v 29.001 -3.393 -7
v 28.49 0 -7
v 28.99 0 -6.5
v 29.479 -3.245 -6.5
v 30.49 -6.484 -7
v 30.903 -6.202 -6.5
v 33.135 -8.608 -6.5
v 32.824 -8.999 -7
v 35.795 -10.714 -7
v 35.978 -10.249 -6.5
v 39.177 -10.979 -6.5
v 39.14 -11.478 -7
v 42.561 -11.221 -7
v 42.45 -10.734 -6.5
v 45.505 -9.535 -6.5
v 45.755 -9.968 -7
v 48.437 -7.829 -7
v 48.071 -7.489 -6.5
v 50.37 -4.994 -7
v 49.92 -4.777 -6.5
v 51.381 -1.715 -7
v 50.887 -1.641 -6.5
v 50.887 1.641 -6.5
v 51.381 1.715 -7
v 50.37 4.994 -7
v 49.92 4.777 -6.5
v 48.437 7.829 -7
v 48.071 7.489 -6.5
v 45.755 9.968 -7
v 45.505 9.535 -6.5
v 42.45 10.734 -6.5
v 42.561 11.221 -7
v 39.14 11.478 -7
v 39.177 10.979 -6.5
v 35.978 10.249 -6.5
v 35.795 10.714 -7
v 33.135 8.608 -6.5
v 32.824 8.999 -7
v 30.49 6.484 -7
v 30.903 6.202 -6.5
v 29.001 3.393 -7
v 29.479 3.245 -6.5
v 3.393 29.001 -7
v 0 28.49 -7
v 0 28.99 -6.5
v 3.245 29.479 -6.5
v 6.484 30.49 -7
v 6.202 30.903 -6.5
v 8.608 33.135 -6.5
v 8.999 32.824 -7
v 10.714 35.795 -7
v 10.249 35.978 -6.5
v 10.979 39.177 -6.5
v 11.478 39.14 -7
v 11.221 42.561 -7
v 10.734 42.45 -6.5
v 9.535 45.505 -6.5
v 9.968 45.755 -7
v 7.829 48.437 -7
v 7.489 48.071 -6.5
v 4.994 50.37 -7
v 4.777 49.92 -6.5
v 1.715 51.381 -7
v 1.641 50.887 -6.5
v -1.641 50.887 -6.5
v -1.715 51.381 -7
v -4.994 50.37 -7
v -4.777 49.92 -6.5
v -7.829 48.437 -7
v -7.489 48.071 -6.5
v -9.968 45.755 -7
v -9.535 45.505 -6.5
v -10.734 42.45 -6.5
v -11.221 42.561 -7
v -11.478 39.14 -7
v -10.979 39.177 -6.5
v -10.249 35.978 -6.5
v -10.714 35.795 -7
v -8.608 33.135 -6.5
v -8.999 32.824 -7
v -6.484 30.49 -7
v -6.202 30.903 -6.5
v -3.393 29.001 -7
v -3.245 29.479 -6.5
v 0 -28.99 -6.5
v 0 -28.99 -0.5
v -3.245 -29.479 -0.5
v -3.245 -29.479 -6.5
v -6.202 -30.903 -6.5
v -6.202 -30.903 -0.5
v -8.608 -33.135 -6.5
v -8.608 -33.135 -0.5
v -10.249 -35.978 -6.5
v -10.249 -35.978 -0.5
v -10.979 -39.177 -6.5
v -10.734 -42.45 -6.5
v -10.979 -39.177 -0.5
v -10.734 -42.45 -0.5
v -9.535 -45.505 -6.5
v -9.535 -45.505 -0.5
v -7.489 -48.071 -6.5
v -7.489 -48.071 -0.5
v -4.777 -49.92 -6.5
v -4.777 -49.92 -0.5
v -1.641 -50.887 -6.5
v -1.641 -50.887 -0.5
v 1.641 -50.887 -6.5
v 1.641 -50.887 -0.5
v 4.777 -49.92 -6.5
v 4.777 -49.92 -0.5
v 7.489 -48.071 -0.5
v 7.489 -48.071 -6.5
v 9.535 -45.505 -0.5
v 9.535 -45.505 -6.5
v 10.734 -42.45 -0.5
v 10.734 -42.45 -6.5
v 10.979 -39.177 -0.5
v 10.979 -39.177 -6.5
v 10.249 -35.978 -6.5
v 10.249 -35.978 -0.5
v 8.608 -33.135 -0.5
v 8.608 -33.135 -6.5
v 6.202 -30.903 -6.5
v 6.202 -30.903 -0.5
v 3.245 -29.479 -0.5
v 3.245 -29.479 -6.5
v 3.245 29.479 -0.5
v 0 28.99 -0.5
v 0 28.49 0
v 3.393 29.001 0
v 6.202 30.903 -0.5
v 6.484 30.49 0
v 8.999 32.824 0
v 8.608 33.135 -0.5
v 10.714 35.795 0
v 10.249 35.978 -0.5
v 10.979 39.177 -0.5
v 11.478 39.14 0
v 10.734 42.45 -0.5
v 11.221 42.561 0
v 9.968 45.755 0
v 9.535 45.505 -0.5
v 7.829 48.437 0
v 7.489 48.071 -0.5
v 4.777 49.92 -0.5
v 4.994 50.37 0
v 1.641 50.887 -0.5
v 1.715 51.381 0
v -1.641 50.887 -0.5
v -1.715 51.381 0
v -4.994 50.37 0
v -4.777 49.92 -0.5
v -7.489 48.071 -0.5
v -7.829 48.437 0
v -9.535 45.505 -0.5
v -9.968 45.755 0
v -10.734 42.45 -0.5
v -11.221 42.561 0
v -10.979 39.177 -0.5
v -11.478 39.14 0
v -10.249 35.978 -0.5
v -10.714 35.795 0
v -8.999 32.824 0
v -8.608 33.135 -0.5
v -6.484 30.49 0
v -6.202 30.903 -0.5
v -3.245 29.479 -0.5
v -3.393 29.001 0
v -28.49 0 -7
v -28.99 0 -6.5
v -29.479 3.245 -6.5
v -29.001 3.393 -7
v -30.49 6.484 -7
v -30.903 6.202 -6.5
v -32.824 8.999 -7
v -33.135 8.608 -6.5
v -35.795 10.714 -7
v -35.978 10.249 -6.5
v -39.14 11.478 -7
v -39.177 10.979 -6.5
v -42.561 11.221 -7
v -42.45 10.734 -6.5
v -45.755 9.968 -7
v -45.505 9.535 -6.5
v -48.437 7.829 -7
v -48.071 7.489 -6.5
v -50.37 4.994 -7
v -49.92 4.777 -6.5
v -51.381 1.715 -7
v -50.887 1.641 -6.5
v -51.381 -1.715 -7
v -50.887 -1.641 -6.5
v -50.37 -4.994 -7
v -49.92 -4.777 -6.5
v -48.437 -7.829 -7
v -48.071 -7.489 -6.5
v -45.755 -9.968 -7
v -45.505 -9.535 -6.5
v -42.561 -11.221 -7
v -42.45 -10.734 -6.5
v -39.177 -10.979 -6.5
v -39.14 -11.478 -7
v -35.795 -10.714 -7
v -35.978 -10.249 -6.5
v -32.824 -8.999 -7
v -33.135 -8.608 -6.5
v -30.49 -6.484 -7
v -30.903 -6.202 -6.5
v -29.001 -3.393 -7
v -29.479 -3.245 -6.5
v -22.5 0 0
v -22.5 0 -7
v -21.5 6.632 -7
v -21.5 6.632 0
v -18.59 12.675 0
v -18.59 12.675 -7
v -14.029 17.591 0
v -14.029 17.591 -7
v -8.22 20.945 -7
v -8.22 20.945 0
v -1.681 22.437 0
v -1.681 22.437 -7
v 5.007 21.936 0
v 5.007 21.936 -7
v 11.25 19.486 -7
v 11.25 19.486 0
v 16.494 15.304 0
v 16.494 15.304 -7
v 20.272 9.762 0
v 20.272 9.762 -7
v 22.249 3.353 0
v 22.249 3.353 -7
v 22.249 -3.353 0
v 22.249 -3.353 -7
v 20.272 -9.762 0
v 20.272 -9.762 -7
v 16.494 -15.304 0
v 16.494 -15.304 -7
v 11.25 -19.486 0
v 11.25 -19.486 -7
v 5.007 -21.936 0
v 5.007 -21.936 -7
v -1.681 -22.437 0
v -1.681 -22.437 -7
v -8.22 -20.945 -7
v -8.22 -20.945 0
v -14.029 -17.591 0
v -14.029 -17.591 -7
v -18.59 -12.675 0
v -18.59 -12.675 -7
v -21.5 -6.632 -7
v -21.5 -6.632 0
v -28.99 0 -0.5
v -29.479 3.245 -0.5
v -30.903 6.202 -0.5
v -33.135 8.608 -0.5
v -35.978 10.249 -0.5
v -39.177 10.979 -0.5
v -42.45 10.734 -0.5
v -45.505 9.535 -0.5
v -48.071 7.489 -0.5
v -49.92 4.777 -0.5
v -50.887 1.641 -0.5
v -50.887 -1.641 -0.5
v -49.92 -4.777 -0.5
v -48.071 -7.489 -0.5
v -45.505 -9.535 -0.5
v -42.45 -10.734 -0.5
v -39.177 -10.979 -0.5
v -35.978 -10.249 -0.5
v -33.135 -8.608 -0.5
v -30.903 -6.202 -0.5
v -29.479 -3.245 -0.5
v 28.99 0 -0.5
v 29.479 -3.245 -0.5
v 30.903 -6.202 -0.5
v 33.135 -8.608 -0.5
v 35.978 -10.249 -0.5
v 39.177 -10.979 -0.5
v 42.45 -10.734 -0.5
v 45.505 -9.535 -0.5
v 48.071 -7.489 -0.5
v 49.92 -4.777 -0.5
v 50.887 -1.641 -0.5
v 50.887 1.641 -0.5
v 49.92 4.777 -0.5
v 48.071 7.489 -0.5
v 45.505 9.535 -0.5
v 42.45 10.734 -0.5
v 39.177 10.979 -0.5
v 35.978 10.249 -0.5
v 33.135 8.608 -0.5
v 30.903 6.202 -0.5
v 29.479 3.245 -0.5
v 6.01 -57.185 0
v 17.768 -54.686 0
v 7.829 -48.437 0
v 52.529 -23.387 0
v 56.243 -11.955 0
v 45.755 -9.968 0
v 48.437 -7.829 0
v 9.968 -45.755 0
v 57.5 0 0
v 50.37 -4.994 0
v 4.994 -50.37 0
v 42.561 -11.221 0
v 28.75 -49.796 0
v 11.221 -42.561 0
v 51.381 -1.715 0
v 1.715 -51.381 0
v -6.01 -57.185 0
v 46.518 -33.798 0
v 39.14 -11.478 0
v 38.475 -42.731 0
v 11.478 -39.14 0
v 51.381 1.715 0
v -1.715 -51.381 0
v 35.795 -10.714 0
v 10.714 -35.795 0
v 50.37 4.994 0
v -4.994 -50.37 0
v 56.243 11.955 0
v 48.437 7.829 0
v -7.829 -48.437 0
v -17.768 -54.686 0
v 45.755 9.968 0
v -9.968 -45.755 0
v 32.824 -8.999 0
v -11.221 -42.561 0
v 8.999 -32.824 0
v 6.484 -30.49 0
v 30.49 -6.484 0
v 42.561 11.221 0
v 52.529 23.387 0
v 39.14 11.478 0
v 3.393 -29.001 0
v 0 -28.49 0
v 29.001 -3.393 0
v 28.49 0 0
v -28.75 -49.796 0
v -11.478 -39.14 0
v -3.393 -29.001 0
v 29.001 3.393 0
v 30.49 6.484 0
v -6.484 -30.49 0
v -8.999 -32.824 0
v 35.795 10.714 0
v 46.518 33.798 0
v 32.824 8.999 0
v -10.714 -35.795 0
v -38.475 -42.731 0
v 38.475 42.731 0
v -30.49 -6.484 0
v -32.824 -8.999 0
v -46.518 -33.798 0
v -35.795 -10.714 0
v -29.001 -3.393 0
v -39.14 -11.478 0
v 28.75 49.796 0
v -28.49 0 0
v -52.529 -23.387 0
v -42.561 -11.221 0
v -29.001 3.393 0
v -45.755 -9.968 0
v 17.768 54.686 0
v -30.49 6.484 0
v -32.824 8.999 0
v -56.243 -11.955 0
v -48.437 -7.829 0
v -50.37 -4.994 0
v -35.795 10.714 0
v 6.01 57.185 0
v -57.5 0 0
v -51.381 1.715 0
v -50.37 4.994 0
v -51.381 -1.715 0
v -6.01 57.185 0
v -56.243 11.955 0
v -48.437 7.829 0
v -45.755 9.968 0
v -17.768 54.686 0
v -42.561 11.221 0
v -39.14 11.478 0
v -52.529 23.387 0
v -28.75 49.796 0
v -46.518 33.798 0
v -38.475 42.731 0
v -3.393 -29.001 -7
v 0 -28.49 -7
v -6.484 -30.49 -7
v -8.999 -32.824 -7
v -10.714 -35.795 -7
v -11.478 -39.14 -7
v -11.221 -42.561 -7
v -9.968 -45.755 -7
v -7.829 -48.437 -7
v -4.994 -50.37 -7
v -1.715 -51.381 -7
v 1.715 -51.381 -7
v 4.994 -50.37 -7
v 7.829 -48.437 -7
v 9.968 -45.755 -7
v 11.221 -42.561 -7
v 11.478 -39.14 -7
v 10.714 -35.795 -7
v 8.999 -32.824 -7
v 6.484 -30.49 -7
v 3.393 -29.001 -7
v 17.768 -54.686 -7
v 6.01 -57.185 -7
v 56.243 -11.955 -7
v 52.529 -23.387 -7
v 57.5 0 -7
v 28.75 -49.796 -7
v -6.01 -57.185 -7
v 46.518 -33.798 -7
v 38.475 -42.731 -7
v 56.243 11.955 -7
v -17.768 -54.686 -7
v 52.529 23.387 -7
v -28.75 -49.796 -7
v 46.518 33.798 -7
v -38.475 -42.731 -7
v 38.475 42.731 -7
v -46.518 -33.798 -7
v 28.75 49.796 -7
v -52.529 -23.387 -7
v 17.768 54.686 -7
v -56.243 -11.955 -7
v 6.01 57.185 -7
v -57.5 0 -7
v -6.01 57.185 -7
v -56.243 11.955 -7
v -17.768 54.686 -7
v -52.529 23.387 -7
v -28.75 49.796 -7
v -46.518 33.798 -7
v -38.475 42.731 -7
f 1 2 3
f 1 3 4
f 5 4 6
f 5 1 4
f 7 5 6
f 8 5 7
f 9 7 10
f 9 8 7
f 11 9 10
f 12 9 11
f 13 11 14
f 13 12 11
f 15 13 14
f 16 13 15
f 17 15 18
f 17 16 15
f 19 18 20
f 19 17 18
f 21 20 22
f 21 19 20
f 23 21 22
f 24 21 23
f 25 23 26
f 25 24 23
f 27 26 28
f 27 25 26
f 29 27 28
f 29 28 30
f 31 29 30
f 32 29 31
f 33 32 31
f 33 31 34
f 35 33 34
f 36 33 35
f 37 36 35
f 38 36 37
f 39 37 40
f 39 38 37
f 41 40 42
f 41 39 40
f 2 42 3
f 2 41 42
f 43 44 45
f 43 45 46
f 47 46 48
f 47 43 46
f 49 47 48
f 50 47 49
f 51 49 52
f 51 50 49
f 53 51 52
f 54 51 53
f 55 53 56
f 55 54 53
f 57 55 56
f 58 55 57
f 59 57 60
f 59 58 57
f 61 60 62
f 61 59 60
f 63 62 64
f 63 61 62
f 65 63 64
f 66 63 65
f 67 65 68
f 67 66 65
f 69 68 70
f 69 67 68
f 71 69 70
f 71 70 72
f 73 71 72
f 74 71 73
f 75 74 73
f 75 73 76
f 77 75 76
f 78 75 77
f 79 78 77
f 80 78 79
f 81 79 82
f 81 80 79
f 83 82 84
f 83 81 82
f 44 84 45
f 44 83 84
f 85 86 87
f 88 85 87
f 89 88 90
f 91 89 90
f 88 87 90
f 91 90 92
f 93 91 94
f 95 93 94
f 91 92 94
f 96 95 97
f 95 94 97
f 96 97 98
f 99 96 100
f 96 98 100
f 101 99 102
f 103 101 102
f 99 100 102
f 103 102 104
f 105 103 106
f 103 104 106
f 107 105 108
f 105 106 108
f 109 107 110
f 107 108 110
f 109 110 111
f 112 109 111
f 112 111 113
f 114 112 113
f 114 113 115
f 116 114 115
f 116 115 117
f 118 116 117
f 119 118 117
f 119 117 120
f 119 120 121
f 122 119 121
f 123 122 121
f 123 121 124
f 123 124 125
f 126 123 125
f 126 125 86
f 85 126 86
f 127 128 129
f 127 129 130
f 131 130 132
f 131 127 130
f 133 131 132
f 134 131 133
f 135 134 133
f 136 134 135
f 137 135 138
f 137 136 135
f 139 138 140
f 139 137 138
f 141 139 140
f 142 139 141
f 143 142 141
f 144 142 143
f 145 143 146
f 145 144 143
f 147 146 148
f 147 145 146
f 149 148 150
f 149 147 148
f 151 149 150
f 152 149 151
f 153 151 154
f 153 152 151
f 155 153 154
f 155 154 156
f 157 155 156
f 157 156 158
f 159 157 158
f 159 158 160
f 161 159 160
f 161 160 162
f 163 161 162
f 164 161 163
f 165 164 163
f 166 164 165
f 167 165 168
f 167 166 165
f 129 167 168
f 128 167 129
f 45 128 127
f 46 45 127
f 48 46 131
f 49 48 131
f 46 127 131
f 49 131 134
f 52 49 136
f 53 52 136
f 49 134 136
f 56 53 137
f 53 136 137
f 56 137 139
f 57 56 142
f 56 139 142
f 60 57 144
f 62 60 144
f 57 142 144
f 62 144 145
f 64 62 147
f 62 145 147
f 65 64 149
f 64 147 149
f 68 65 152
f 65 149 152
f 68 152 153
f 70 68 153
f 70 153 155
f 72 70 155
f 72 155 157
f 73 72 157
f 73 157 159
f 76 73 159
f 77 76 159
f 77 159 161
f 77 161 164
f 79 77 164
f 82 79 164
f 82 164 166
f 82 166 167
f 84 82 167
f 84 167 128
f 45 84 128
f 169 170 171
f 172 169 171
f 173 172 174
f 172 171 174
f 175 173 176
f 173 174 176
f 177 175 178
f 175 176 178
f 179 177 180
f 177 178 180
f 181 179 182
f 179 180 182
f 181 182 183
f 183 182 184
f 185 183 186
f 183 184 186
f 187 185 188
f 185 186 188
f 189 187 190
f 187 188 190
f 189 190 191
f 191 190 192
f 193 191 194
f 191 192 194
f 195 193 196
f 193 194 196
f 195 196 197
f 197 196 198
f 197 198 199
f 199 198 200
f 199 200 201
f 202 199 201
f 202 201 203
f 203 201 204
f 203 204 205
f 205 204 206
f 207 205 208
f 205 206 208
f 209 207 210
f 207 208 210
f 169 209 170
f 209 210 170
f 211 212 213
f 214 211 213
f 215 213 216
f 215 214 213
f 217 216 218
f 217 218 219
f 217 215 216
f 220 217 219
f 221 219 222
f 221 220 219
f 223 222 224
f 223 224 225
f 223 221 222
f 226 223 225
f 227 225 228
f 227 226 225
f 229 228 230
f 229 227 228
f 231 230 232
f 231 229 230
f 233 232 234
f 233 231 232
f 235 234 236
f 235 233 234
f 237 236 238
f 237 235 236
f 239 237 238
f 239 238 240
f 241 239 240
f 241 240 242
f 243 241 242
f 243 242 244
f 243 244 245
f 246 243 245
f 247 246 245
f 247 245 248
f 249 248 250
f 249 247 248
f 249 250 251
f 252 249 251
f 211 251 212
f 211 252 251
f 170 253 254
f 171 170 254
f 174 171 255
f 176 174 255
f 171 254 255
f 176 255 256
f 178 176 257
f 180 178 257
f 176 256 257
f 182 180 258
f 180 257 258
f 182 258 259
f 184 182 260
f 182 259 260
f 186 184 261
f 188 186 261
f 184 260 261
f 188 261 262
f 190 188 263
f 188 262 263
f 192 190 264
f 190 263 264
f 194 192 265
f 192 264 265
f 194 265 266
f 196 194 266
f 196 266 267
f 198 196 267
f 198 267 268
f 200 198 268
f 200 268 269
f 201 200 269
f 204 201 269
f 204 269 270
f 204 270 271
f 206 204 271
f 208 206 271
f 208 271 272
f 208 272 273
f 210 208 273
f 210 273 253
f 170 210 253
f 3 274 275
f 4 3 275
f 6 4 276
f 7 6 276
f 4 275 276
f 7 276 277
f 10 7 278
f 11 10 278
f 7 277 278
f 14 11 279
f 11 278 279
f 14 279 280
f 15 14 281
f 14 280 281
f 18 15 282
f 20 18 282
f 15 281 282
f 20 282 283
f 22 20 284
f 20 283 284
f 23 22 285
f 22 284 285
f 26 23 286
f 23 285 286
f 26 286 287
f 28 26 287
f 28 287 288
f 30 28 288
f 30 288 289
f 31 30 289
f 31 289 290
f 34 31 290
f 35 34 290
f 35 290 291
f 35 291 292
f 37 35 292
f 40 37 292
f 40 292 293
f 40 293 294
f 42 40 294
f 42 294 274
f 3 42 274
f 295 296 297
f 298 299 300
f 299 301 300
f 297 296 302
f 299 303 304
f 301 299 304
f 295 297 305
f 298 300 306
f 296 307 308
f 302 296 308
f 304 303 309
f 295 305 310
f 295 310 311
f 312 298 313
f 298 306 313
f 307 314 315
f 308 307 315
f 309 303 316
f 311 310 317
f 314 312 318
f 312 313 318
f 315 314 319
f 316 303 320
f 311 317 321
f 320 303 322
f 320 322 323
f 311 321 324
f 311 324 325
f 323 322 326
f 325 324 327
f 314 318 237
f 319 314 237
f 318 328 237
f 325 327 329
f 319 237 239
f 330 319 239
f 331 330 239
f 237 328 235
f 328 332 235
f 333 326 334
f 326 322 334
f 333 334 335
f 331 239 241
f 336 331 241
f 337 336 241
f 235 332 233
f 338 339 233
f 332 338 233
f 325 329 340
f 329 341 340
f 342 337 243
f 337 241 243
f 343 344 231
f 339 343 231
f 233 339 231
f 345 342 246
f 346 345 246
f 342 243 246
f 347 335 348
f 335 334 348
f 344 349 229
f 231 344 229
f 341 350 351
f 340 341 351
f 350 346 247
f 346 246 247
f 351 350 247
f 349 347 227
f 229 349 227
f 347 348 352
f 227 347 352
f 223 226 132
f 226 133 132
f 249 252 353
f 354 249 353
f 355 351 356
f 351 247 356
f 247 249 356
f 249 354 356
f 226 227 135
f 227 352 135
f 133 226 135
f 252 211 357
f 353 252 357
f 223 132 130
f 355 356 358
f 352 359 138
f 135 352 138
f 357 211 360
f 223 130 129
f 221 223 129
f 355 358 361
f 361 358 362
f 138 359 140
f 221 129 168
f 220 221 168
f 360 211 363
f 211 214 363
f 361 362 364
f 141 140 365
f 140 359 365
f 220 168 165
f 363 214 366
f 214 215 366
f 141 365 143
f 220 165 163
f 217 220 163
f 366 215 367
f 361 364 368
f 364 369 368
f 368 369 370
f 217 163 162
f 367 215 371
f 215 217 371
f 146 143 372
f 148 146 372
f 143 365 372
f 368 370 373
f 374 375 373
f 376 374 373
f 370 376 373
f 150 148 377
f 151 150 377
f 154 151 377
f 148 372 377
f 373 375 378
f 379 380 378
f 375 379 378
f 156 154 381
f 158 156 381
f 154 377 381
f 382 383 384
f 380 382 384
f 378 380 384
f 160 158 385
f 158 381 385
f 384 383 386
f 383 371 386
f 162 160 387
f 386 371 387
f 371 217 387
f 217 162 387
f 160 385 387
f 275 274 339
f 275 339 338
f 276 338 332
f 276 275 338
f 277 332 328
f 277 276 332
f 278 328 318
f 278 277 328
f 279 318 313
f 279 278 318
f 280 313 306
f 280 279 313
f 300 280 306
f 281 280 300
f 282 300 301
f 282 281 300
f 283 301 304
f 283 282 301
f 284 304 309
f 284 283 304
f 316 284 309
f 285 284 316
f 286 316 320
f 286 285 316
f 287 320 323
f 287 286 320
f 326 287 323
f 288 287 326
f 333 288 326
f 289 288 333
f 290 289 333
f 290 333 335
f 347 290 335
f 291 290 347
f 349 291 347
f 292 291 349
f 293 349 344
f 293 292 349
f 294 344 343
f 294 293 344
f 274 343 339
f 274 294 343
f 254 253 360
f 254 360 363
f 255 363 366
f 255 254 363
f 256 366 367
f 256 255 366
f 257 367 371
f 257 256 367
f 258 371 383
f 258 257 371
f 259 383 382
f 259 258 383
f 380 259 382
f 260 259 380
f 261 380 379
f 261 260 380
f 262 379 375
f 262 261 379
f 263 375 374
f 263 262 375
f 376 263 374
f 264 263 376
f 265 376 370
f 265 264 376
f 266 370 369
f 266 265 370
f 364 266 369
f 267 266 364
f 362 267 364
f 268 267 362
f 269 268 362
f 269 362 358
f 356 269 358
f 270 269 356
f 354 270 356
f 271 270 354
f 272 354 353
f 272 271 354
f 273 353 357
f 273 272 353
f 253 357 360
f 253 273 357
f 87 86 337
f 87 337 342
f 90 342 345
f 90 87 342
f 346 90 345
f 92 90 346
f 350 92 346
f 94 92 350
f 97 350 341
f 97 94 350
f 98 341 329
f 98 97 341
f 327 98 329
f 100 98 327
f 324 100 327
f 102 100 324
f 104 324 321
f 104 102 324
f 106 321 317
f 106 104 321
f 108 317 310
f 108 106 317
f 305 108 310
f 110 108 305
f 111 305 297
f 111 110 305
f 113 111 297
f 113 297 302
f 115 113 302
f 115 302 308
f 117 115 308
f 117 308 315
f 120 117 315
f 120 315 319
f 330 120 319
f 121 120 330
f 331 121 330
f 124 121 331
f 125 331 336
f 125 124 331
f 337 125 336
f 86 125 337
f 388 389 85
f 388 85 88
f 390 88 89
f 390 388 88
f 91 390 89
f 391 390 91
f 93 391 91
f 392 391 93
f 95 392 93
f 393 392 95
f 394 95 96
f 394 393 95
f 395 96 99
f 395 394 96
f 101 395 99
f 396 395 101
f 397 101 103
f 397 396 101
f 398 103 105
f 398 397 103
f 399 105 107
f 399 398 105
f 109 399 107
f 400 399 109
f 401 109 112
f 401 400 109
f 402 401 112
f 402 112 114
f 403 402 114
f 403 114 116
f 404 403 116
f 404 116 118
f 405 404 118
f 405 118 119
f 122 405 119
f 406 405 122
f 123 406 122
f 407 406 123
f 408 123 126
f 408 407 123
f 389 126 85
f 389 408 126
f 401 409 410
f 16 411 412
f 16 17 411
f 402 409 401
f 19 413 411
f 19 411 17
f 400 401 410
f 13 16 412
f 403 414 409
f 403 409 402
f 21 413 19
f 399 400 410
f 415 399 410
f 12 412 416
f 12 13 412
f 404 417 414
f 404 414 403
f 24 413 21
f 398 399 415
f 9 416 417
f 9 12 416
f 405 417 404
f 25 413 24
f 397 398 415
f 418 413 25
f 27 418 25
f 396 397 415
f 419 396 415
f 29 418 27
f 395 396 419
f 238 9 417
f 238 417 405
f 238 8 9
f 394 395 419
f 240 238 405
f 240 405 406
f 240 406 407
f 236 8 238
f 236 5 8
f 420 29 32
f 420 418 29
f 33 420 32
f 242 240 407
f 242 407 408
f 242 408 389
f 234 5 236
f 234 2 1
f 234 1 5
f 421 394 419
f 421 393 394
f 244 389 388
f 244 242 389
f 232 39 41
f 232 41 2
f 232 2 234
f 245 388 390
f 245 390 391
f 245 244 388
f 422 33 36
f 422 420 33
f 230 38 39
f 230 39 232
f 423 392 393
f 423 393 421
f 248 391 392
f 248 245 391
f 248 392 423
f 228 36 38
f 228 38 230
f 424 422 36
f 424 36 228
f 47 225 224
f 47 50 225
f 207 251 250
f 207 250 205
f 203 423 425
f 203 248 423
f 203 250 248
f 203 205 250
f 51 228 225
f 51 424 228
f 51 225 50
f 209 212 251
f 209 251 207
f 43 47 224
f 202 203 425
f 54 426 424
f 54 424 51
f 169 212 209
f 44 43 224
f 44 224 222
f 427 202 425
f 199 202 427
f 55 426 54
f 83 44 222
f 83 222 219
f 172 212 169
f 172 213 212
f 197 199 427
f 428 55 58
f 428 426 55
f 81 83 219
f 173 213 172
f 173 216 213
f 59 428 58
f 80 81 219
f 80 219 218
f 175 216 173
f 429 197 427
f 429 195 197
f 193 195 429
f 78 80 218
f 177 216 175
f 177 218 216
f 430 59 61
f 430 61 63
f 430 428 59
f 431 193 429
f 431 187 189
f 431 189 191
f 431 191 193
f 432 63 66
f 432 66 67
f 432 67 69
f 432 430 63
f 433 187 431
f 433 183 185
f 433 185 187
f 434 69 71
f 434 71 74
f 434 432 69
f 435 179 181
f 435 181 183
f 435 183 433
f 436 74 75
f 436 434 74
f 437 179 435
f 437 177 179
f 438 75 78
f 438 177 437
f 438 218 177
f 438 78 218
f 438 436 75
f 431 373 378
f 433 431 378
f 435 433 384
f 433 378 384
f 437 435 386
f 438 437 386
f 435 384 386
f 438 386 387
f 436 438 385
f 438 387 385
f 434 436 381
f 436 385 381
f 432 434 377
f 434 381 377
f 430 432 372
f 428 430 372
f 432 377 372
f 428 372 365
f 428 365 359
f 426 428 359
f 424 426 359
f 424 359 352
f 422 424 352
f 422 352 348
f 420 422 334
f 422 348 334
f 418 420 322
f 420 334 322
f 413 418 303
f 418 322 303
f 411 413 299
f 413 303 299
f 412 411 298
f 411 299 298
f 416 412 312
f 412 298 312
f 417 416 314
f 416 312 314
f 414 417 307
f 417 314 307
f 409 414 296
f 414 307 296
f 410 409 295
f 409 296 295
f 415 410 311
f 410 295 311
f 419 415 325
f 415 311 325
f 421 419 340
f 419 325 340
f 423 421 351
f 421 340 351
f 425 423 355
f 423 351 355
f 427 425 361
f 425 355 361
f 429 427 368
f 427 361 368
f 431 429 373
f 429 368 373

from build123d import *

# Parameters (mm, degrees)
SKETCH3_R                    = 57.5
SKETCH3_R_2                  = 22.5
BOSS_EXTRUDE2_DEPTH          = 7
SKETCH12_R                   = 11.01
CUT_EXTRUDE7_DEPTH           = 82.618012718
CHAMFER5_SIZE                = 0.5
CIRPATTERN4_COUNT            = 4
CHAMFER5_OF_CIRPATTERN4_SIZE = 0.5


with BuildPart() as part:
    # Sketch3 → Boss-Extrude2 (new body)
    with BuildSketch(Plane(origin=(0, 0, 0), x_dir=(-1, 0, 0), z_dir=(0, 0, -1))):
        Circle(SKETCH3_R)
        Circle(SKETCH3_R_2, mode=Mode.SUBTRACT)
    extrude(amount=BOSS_EXTRUDE2_DEPTH)

    # Sketch12 → Cut-Extrude7 (cut, through all)
    with BuildSketch(Plane.XY):
        with Locations((-40, 0)):
            Circle(SKETCH12_R)
    cut_extrude7 = extrude(amount=-CUT_EXTRUDE7_DEPTH, mode=Mode.SUBTRACT)

    # Chamfer5
    chamfer5_edges = [part.edges().sort_by_distance(p)[0] for p in [
        (-51.01, 0, -7),
        (-51.01, 0, 0),
    ]]
    chamfer(chamfer5_edges, length=CHAMFER5_SIZE)

    # CirPattern4: Cut-Extrude7 ×4 about axis
    cirpattern4_axis = Axis((0, 0, -7), (0, 0, 1))
    for i in range(1, CIRPATTERN4_COUNT):
        add(cut_extrude7.rotate(cirpattern4_axis, i * 360 / CIRPATTERN4_COUNT), mode=Mode.SUBTRACT)

    # Chamfer5 of CirPattern4
    chamfer5_of_cirpattern4_edges = [part.edges().sort_by_distance(p)[0] for p in [
        (0, -51.01, -7),
        (0, -51.01, 0),
        (51.01, 0, -7),
        (51.01, 0, 0),
        (0, 51.01, -7),
        (0, 51.01, 0),
    ]]
    chamfer(chamfer5_of_cirpattern4_edges, length=CHAMFER5_OF_CIRPATTERN4_SIZE)


solid = part.part
